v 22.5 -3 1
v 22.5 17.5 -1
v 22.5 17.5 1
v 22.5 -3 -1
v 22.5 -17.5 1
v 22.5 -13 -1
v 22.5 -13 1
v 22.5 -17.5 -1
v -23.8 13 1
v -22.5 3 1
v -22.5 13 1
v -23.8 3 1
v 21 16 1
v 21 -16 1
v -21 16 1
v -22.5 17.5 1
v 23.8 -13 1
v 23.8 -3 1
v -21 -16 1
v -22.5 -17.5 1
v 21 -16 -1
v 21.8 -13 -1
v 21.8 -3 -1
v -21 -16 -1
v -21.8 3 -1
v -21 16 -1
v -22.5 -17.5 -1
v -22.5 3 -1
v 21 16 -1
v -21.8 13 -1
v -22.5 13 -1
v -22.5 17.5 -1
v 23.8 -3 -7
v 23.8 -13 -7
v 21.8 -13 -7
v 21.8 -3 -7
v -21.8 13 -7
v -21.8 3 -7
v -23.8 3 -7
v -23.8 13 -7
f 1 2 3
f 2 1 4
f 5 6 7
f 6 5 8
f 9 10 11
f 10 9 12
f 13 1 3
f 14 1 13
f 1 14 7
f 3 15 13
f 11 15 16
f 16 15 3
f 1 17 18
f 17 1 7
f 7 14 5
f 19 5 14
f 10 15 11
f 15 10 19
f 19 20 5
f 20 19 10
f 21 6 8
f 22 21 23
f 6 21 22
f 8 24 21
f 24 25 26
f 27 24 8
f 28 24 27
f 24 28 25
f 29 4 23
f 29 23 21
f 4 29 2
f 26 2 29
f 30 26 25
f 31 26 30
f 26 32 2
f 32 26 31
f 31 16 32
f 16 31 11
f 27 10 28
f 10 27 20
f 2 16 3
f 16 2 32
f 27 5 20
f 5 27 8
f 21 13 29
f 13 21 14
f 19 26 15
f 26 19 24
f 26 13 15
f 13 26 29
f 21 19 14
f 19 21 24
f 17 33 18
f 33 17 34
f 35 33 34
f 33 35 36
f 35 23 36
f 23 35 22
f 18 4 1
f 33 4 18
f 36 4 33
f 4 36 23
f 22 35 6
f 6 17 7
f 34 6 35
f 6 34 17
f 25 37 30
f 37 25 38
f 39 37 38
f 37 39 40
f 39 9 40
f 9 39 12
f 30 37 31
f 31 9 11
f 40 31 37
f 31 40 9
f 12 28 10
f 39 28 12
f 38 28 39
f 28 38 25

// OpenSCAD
translate([22.8, -8, -3]) {
    cube([2, 10, 8], center=true);
}

translate([-22.8, 8, -3]) {
    cube([2, 10, 8], center=true);
}

difference() {
    union() {
        cube([45, 35, 2], center=true);
        }
        cube([42, 32, 4], center=true);
    
    }
